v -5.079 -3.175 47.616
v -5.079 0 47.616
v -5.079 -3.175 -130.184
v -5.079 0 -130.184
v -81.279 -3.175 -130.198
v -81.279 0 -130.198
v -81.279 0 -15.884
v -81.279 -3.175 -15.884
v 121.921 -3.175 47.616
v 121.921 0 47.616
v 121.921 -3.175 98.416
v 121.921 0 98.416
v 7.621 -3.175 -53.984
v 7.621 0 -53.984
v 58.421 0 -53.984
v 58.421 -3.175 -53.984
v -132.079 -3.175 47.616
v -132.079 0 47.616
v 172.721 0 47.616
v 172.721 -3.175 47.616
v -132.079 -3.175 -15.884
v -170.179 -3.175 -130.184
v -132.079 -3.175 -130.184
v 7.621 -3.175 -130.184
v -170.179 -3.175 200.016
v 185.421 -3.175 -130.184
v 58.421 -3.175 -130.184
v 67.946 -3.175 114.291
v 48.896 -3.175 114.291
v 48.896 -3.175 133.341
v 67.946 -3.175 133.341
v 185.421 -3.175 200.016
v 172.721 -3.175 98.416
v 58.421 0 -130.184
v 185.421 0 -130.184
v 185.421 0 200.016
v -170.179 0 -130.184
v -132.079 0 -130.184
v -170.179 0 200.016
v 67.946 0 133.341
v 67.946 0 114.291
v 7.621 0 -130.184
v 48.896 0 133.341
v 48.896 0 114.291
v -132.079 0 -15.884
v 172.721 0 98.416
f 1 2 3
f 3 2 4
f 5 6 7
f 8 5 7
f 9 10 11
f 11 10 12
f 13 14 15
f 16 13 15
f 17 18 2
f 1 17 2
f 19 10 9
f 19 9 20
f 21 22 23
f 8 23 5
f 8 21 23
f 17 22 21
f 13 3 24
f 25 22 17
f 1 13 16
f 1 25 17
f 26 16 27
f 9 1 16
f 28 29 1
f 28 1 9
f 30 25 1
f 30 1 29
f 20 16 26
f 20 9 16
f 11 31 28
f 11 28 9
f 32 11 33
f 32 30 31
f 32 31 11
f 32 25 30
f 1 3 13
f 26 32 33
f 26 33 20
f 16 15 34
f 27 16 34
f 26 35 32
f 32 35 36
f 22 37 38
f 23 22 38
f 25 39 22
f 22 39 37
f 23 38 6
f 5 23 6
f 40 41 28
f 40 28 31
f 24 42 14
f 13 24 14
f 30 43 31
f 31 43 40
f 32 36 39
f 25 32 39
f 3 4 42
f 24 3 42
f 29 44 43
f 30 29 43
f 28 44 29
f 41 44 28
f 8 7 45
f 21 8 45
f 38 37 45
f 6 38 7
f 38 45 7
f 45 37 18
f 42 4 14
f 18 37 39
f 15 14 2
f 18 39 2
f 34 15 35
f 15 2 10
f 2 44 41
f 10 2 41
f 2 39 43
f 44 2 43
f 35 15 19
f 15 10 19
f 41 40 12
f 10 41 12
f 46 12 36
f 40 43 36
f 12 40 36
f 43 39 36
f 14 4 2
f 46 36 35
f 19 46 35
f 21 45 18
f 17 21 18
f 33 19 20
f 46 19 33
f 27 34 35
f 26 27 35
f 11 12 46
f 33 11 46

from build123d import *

# Parameters (mm, degrees)
F0_W     = 50.8
F0_H     = 50.8
F0_W_2   = 19.05
F0_H_2   = 19.05
F1_DEPTH = 3.175


with BuildPart() as f1:
    # F0 (on Front) → F1 (new body)
    with BuildSketch(Plane.XZ):
        Polygon((185.420972, 200.016092), (-170.179028, 200.016092), (-170.179028, -130.183908), (-132.079028, -130.183908), (-81.279028, -130.197912), (-81.279028, -15.883908), (-132.079028, -15.883908), (-132.079028, 47.616092), (-5.079028, 47.616092), (-5.079028, -130.183908), (7.620972, -130.183908), (7.620972, -53.983908), (58.420972, -53.983908), (58.420972, -130.183908), (185.420972, -130.183908), (185.420972, 114.291092), align=None)
        with Locations((147.320972, 73.016092)):
            Rectangle(F0_W, F0_H, mode=Mode.SUBTRACT)
        with Locations((58.420972, 123.816092)):
            Rectangle(F0_W_2, F0_H_2, mode=Mode.SUBTRACT)
    extrude(amount=F1_DEPTH)


solid = f1.part
